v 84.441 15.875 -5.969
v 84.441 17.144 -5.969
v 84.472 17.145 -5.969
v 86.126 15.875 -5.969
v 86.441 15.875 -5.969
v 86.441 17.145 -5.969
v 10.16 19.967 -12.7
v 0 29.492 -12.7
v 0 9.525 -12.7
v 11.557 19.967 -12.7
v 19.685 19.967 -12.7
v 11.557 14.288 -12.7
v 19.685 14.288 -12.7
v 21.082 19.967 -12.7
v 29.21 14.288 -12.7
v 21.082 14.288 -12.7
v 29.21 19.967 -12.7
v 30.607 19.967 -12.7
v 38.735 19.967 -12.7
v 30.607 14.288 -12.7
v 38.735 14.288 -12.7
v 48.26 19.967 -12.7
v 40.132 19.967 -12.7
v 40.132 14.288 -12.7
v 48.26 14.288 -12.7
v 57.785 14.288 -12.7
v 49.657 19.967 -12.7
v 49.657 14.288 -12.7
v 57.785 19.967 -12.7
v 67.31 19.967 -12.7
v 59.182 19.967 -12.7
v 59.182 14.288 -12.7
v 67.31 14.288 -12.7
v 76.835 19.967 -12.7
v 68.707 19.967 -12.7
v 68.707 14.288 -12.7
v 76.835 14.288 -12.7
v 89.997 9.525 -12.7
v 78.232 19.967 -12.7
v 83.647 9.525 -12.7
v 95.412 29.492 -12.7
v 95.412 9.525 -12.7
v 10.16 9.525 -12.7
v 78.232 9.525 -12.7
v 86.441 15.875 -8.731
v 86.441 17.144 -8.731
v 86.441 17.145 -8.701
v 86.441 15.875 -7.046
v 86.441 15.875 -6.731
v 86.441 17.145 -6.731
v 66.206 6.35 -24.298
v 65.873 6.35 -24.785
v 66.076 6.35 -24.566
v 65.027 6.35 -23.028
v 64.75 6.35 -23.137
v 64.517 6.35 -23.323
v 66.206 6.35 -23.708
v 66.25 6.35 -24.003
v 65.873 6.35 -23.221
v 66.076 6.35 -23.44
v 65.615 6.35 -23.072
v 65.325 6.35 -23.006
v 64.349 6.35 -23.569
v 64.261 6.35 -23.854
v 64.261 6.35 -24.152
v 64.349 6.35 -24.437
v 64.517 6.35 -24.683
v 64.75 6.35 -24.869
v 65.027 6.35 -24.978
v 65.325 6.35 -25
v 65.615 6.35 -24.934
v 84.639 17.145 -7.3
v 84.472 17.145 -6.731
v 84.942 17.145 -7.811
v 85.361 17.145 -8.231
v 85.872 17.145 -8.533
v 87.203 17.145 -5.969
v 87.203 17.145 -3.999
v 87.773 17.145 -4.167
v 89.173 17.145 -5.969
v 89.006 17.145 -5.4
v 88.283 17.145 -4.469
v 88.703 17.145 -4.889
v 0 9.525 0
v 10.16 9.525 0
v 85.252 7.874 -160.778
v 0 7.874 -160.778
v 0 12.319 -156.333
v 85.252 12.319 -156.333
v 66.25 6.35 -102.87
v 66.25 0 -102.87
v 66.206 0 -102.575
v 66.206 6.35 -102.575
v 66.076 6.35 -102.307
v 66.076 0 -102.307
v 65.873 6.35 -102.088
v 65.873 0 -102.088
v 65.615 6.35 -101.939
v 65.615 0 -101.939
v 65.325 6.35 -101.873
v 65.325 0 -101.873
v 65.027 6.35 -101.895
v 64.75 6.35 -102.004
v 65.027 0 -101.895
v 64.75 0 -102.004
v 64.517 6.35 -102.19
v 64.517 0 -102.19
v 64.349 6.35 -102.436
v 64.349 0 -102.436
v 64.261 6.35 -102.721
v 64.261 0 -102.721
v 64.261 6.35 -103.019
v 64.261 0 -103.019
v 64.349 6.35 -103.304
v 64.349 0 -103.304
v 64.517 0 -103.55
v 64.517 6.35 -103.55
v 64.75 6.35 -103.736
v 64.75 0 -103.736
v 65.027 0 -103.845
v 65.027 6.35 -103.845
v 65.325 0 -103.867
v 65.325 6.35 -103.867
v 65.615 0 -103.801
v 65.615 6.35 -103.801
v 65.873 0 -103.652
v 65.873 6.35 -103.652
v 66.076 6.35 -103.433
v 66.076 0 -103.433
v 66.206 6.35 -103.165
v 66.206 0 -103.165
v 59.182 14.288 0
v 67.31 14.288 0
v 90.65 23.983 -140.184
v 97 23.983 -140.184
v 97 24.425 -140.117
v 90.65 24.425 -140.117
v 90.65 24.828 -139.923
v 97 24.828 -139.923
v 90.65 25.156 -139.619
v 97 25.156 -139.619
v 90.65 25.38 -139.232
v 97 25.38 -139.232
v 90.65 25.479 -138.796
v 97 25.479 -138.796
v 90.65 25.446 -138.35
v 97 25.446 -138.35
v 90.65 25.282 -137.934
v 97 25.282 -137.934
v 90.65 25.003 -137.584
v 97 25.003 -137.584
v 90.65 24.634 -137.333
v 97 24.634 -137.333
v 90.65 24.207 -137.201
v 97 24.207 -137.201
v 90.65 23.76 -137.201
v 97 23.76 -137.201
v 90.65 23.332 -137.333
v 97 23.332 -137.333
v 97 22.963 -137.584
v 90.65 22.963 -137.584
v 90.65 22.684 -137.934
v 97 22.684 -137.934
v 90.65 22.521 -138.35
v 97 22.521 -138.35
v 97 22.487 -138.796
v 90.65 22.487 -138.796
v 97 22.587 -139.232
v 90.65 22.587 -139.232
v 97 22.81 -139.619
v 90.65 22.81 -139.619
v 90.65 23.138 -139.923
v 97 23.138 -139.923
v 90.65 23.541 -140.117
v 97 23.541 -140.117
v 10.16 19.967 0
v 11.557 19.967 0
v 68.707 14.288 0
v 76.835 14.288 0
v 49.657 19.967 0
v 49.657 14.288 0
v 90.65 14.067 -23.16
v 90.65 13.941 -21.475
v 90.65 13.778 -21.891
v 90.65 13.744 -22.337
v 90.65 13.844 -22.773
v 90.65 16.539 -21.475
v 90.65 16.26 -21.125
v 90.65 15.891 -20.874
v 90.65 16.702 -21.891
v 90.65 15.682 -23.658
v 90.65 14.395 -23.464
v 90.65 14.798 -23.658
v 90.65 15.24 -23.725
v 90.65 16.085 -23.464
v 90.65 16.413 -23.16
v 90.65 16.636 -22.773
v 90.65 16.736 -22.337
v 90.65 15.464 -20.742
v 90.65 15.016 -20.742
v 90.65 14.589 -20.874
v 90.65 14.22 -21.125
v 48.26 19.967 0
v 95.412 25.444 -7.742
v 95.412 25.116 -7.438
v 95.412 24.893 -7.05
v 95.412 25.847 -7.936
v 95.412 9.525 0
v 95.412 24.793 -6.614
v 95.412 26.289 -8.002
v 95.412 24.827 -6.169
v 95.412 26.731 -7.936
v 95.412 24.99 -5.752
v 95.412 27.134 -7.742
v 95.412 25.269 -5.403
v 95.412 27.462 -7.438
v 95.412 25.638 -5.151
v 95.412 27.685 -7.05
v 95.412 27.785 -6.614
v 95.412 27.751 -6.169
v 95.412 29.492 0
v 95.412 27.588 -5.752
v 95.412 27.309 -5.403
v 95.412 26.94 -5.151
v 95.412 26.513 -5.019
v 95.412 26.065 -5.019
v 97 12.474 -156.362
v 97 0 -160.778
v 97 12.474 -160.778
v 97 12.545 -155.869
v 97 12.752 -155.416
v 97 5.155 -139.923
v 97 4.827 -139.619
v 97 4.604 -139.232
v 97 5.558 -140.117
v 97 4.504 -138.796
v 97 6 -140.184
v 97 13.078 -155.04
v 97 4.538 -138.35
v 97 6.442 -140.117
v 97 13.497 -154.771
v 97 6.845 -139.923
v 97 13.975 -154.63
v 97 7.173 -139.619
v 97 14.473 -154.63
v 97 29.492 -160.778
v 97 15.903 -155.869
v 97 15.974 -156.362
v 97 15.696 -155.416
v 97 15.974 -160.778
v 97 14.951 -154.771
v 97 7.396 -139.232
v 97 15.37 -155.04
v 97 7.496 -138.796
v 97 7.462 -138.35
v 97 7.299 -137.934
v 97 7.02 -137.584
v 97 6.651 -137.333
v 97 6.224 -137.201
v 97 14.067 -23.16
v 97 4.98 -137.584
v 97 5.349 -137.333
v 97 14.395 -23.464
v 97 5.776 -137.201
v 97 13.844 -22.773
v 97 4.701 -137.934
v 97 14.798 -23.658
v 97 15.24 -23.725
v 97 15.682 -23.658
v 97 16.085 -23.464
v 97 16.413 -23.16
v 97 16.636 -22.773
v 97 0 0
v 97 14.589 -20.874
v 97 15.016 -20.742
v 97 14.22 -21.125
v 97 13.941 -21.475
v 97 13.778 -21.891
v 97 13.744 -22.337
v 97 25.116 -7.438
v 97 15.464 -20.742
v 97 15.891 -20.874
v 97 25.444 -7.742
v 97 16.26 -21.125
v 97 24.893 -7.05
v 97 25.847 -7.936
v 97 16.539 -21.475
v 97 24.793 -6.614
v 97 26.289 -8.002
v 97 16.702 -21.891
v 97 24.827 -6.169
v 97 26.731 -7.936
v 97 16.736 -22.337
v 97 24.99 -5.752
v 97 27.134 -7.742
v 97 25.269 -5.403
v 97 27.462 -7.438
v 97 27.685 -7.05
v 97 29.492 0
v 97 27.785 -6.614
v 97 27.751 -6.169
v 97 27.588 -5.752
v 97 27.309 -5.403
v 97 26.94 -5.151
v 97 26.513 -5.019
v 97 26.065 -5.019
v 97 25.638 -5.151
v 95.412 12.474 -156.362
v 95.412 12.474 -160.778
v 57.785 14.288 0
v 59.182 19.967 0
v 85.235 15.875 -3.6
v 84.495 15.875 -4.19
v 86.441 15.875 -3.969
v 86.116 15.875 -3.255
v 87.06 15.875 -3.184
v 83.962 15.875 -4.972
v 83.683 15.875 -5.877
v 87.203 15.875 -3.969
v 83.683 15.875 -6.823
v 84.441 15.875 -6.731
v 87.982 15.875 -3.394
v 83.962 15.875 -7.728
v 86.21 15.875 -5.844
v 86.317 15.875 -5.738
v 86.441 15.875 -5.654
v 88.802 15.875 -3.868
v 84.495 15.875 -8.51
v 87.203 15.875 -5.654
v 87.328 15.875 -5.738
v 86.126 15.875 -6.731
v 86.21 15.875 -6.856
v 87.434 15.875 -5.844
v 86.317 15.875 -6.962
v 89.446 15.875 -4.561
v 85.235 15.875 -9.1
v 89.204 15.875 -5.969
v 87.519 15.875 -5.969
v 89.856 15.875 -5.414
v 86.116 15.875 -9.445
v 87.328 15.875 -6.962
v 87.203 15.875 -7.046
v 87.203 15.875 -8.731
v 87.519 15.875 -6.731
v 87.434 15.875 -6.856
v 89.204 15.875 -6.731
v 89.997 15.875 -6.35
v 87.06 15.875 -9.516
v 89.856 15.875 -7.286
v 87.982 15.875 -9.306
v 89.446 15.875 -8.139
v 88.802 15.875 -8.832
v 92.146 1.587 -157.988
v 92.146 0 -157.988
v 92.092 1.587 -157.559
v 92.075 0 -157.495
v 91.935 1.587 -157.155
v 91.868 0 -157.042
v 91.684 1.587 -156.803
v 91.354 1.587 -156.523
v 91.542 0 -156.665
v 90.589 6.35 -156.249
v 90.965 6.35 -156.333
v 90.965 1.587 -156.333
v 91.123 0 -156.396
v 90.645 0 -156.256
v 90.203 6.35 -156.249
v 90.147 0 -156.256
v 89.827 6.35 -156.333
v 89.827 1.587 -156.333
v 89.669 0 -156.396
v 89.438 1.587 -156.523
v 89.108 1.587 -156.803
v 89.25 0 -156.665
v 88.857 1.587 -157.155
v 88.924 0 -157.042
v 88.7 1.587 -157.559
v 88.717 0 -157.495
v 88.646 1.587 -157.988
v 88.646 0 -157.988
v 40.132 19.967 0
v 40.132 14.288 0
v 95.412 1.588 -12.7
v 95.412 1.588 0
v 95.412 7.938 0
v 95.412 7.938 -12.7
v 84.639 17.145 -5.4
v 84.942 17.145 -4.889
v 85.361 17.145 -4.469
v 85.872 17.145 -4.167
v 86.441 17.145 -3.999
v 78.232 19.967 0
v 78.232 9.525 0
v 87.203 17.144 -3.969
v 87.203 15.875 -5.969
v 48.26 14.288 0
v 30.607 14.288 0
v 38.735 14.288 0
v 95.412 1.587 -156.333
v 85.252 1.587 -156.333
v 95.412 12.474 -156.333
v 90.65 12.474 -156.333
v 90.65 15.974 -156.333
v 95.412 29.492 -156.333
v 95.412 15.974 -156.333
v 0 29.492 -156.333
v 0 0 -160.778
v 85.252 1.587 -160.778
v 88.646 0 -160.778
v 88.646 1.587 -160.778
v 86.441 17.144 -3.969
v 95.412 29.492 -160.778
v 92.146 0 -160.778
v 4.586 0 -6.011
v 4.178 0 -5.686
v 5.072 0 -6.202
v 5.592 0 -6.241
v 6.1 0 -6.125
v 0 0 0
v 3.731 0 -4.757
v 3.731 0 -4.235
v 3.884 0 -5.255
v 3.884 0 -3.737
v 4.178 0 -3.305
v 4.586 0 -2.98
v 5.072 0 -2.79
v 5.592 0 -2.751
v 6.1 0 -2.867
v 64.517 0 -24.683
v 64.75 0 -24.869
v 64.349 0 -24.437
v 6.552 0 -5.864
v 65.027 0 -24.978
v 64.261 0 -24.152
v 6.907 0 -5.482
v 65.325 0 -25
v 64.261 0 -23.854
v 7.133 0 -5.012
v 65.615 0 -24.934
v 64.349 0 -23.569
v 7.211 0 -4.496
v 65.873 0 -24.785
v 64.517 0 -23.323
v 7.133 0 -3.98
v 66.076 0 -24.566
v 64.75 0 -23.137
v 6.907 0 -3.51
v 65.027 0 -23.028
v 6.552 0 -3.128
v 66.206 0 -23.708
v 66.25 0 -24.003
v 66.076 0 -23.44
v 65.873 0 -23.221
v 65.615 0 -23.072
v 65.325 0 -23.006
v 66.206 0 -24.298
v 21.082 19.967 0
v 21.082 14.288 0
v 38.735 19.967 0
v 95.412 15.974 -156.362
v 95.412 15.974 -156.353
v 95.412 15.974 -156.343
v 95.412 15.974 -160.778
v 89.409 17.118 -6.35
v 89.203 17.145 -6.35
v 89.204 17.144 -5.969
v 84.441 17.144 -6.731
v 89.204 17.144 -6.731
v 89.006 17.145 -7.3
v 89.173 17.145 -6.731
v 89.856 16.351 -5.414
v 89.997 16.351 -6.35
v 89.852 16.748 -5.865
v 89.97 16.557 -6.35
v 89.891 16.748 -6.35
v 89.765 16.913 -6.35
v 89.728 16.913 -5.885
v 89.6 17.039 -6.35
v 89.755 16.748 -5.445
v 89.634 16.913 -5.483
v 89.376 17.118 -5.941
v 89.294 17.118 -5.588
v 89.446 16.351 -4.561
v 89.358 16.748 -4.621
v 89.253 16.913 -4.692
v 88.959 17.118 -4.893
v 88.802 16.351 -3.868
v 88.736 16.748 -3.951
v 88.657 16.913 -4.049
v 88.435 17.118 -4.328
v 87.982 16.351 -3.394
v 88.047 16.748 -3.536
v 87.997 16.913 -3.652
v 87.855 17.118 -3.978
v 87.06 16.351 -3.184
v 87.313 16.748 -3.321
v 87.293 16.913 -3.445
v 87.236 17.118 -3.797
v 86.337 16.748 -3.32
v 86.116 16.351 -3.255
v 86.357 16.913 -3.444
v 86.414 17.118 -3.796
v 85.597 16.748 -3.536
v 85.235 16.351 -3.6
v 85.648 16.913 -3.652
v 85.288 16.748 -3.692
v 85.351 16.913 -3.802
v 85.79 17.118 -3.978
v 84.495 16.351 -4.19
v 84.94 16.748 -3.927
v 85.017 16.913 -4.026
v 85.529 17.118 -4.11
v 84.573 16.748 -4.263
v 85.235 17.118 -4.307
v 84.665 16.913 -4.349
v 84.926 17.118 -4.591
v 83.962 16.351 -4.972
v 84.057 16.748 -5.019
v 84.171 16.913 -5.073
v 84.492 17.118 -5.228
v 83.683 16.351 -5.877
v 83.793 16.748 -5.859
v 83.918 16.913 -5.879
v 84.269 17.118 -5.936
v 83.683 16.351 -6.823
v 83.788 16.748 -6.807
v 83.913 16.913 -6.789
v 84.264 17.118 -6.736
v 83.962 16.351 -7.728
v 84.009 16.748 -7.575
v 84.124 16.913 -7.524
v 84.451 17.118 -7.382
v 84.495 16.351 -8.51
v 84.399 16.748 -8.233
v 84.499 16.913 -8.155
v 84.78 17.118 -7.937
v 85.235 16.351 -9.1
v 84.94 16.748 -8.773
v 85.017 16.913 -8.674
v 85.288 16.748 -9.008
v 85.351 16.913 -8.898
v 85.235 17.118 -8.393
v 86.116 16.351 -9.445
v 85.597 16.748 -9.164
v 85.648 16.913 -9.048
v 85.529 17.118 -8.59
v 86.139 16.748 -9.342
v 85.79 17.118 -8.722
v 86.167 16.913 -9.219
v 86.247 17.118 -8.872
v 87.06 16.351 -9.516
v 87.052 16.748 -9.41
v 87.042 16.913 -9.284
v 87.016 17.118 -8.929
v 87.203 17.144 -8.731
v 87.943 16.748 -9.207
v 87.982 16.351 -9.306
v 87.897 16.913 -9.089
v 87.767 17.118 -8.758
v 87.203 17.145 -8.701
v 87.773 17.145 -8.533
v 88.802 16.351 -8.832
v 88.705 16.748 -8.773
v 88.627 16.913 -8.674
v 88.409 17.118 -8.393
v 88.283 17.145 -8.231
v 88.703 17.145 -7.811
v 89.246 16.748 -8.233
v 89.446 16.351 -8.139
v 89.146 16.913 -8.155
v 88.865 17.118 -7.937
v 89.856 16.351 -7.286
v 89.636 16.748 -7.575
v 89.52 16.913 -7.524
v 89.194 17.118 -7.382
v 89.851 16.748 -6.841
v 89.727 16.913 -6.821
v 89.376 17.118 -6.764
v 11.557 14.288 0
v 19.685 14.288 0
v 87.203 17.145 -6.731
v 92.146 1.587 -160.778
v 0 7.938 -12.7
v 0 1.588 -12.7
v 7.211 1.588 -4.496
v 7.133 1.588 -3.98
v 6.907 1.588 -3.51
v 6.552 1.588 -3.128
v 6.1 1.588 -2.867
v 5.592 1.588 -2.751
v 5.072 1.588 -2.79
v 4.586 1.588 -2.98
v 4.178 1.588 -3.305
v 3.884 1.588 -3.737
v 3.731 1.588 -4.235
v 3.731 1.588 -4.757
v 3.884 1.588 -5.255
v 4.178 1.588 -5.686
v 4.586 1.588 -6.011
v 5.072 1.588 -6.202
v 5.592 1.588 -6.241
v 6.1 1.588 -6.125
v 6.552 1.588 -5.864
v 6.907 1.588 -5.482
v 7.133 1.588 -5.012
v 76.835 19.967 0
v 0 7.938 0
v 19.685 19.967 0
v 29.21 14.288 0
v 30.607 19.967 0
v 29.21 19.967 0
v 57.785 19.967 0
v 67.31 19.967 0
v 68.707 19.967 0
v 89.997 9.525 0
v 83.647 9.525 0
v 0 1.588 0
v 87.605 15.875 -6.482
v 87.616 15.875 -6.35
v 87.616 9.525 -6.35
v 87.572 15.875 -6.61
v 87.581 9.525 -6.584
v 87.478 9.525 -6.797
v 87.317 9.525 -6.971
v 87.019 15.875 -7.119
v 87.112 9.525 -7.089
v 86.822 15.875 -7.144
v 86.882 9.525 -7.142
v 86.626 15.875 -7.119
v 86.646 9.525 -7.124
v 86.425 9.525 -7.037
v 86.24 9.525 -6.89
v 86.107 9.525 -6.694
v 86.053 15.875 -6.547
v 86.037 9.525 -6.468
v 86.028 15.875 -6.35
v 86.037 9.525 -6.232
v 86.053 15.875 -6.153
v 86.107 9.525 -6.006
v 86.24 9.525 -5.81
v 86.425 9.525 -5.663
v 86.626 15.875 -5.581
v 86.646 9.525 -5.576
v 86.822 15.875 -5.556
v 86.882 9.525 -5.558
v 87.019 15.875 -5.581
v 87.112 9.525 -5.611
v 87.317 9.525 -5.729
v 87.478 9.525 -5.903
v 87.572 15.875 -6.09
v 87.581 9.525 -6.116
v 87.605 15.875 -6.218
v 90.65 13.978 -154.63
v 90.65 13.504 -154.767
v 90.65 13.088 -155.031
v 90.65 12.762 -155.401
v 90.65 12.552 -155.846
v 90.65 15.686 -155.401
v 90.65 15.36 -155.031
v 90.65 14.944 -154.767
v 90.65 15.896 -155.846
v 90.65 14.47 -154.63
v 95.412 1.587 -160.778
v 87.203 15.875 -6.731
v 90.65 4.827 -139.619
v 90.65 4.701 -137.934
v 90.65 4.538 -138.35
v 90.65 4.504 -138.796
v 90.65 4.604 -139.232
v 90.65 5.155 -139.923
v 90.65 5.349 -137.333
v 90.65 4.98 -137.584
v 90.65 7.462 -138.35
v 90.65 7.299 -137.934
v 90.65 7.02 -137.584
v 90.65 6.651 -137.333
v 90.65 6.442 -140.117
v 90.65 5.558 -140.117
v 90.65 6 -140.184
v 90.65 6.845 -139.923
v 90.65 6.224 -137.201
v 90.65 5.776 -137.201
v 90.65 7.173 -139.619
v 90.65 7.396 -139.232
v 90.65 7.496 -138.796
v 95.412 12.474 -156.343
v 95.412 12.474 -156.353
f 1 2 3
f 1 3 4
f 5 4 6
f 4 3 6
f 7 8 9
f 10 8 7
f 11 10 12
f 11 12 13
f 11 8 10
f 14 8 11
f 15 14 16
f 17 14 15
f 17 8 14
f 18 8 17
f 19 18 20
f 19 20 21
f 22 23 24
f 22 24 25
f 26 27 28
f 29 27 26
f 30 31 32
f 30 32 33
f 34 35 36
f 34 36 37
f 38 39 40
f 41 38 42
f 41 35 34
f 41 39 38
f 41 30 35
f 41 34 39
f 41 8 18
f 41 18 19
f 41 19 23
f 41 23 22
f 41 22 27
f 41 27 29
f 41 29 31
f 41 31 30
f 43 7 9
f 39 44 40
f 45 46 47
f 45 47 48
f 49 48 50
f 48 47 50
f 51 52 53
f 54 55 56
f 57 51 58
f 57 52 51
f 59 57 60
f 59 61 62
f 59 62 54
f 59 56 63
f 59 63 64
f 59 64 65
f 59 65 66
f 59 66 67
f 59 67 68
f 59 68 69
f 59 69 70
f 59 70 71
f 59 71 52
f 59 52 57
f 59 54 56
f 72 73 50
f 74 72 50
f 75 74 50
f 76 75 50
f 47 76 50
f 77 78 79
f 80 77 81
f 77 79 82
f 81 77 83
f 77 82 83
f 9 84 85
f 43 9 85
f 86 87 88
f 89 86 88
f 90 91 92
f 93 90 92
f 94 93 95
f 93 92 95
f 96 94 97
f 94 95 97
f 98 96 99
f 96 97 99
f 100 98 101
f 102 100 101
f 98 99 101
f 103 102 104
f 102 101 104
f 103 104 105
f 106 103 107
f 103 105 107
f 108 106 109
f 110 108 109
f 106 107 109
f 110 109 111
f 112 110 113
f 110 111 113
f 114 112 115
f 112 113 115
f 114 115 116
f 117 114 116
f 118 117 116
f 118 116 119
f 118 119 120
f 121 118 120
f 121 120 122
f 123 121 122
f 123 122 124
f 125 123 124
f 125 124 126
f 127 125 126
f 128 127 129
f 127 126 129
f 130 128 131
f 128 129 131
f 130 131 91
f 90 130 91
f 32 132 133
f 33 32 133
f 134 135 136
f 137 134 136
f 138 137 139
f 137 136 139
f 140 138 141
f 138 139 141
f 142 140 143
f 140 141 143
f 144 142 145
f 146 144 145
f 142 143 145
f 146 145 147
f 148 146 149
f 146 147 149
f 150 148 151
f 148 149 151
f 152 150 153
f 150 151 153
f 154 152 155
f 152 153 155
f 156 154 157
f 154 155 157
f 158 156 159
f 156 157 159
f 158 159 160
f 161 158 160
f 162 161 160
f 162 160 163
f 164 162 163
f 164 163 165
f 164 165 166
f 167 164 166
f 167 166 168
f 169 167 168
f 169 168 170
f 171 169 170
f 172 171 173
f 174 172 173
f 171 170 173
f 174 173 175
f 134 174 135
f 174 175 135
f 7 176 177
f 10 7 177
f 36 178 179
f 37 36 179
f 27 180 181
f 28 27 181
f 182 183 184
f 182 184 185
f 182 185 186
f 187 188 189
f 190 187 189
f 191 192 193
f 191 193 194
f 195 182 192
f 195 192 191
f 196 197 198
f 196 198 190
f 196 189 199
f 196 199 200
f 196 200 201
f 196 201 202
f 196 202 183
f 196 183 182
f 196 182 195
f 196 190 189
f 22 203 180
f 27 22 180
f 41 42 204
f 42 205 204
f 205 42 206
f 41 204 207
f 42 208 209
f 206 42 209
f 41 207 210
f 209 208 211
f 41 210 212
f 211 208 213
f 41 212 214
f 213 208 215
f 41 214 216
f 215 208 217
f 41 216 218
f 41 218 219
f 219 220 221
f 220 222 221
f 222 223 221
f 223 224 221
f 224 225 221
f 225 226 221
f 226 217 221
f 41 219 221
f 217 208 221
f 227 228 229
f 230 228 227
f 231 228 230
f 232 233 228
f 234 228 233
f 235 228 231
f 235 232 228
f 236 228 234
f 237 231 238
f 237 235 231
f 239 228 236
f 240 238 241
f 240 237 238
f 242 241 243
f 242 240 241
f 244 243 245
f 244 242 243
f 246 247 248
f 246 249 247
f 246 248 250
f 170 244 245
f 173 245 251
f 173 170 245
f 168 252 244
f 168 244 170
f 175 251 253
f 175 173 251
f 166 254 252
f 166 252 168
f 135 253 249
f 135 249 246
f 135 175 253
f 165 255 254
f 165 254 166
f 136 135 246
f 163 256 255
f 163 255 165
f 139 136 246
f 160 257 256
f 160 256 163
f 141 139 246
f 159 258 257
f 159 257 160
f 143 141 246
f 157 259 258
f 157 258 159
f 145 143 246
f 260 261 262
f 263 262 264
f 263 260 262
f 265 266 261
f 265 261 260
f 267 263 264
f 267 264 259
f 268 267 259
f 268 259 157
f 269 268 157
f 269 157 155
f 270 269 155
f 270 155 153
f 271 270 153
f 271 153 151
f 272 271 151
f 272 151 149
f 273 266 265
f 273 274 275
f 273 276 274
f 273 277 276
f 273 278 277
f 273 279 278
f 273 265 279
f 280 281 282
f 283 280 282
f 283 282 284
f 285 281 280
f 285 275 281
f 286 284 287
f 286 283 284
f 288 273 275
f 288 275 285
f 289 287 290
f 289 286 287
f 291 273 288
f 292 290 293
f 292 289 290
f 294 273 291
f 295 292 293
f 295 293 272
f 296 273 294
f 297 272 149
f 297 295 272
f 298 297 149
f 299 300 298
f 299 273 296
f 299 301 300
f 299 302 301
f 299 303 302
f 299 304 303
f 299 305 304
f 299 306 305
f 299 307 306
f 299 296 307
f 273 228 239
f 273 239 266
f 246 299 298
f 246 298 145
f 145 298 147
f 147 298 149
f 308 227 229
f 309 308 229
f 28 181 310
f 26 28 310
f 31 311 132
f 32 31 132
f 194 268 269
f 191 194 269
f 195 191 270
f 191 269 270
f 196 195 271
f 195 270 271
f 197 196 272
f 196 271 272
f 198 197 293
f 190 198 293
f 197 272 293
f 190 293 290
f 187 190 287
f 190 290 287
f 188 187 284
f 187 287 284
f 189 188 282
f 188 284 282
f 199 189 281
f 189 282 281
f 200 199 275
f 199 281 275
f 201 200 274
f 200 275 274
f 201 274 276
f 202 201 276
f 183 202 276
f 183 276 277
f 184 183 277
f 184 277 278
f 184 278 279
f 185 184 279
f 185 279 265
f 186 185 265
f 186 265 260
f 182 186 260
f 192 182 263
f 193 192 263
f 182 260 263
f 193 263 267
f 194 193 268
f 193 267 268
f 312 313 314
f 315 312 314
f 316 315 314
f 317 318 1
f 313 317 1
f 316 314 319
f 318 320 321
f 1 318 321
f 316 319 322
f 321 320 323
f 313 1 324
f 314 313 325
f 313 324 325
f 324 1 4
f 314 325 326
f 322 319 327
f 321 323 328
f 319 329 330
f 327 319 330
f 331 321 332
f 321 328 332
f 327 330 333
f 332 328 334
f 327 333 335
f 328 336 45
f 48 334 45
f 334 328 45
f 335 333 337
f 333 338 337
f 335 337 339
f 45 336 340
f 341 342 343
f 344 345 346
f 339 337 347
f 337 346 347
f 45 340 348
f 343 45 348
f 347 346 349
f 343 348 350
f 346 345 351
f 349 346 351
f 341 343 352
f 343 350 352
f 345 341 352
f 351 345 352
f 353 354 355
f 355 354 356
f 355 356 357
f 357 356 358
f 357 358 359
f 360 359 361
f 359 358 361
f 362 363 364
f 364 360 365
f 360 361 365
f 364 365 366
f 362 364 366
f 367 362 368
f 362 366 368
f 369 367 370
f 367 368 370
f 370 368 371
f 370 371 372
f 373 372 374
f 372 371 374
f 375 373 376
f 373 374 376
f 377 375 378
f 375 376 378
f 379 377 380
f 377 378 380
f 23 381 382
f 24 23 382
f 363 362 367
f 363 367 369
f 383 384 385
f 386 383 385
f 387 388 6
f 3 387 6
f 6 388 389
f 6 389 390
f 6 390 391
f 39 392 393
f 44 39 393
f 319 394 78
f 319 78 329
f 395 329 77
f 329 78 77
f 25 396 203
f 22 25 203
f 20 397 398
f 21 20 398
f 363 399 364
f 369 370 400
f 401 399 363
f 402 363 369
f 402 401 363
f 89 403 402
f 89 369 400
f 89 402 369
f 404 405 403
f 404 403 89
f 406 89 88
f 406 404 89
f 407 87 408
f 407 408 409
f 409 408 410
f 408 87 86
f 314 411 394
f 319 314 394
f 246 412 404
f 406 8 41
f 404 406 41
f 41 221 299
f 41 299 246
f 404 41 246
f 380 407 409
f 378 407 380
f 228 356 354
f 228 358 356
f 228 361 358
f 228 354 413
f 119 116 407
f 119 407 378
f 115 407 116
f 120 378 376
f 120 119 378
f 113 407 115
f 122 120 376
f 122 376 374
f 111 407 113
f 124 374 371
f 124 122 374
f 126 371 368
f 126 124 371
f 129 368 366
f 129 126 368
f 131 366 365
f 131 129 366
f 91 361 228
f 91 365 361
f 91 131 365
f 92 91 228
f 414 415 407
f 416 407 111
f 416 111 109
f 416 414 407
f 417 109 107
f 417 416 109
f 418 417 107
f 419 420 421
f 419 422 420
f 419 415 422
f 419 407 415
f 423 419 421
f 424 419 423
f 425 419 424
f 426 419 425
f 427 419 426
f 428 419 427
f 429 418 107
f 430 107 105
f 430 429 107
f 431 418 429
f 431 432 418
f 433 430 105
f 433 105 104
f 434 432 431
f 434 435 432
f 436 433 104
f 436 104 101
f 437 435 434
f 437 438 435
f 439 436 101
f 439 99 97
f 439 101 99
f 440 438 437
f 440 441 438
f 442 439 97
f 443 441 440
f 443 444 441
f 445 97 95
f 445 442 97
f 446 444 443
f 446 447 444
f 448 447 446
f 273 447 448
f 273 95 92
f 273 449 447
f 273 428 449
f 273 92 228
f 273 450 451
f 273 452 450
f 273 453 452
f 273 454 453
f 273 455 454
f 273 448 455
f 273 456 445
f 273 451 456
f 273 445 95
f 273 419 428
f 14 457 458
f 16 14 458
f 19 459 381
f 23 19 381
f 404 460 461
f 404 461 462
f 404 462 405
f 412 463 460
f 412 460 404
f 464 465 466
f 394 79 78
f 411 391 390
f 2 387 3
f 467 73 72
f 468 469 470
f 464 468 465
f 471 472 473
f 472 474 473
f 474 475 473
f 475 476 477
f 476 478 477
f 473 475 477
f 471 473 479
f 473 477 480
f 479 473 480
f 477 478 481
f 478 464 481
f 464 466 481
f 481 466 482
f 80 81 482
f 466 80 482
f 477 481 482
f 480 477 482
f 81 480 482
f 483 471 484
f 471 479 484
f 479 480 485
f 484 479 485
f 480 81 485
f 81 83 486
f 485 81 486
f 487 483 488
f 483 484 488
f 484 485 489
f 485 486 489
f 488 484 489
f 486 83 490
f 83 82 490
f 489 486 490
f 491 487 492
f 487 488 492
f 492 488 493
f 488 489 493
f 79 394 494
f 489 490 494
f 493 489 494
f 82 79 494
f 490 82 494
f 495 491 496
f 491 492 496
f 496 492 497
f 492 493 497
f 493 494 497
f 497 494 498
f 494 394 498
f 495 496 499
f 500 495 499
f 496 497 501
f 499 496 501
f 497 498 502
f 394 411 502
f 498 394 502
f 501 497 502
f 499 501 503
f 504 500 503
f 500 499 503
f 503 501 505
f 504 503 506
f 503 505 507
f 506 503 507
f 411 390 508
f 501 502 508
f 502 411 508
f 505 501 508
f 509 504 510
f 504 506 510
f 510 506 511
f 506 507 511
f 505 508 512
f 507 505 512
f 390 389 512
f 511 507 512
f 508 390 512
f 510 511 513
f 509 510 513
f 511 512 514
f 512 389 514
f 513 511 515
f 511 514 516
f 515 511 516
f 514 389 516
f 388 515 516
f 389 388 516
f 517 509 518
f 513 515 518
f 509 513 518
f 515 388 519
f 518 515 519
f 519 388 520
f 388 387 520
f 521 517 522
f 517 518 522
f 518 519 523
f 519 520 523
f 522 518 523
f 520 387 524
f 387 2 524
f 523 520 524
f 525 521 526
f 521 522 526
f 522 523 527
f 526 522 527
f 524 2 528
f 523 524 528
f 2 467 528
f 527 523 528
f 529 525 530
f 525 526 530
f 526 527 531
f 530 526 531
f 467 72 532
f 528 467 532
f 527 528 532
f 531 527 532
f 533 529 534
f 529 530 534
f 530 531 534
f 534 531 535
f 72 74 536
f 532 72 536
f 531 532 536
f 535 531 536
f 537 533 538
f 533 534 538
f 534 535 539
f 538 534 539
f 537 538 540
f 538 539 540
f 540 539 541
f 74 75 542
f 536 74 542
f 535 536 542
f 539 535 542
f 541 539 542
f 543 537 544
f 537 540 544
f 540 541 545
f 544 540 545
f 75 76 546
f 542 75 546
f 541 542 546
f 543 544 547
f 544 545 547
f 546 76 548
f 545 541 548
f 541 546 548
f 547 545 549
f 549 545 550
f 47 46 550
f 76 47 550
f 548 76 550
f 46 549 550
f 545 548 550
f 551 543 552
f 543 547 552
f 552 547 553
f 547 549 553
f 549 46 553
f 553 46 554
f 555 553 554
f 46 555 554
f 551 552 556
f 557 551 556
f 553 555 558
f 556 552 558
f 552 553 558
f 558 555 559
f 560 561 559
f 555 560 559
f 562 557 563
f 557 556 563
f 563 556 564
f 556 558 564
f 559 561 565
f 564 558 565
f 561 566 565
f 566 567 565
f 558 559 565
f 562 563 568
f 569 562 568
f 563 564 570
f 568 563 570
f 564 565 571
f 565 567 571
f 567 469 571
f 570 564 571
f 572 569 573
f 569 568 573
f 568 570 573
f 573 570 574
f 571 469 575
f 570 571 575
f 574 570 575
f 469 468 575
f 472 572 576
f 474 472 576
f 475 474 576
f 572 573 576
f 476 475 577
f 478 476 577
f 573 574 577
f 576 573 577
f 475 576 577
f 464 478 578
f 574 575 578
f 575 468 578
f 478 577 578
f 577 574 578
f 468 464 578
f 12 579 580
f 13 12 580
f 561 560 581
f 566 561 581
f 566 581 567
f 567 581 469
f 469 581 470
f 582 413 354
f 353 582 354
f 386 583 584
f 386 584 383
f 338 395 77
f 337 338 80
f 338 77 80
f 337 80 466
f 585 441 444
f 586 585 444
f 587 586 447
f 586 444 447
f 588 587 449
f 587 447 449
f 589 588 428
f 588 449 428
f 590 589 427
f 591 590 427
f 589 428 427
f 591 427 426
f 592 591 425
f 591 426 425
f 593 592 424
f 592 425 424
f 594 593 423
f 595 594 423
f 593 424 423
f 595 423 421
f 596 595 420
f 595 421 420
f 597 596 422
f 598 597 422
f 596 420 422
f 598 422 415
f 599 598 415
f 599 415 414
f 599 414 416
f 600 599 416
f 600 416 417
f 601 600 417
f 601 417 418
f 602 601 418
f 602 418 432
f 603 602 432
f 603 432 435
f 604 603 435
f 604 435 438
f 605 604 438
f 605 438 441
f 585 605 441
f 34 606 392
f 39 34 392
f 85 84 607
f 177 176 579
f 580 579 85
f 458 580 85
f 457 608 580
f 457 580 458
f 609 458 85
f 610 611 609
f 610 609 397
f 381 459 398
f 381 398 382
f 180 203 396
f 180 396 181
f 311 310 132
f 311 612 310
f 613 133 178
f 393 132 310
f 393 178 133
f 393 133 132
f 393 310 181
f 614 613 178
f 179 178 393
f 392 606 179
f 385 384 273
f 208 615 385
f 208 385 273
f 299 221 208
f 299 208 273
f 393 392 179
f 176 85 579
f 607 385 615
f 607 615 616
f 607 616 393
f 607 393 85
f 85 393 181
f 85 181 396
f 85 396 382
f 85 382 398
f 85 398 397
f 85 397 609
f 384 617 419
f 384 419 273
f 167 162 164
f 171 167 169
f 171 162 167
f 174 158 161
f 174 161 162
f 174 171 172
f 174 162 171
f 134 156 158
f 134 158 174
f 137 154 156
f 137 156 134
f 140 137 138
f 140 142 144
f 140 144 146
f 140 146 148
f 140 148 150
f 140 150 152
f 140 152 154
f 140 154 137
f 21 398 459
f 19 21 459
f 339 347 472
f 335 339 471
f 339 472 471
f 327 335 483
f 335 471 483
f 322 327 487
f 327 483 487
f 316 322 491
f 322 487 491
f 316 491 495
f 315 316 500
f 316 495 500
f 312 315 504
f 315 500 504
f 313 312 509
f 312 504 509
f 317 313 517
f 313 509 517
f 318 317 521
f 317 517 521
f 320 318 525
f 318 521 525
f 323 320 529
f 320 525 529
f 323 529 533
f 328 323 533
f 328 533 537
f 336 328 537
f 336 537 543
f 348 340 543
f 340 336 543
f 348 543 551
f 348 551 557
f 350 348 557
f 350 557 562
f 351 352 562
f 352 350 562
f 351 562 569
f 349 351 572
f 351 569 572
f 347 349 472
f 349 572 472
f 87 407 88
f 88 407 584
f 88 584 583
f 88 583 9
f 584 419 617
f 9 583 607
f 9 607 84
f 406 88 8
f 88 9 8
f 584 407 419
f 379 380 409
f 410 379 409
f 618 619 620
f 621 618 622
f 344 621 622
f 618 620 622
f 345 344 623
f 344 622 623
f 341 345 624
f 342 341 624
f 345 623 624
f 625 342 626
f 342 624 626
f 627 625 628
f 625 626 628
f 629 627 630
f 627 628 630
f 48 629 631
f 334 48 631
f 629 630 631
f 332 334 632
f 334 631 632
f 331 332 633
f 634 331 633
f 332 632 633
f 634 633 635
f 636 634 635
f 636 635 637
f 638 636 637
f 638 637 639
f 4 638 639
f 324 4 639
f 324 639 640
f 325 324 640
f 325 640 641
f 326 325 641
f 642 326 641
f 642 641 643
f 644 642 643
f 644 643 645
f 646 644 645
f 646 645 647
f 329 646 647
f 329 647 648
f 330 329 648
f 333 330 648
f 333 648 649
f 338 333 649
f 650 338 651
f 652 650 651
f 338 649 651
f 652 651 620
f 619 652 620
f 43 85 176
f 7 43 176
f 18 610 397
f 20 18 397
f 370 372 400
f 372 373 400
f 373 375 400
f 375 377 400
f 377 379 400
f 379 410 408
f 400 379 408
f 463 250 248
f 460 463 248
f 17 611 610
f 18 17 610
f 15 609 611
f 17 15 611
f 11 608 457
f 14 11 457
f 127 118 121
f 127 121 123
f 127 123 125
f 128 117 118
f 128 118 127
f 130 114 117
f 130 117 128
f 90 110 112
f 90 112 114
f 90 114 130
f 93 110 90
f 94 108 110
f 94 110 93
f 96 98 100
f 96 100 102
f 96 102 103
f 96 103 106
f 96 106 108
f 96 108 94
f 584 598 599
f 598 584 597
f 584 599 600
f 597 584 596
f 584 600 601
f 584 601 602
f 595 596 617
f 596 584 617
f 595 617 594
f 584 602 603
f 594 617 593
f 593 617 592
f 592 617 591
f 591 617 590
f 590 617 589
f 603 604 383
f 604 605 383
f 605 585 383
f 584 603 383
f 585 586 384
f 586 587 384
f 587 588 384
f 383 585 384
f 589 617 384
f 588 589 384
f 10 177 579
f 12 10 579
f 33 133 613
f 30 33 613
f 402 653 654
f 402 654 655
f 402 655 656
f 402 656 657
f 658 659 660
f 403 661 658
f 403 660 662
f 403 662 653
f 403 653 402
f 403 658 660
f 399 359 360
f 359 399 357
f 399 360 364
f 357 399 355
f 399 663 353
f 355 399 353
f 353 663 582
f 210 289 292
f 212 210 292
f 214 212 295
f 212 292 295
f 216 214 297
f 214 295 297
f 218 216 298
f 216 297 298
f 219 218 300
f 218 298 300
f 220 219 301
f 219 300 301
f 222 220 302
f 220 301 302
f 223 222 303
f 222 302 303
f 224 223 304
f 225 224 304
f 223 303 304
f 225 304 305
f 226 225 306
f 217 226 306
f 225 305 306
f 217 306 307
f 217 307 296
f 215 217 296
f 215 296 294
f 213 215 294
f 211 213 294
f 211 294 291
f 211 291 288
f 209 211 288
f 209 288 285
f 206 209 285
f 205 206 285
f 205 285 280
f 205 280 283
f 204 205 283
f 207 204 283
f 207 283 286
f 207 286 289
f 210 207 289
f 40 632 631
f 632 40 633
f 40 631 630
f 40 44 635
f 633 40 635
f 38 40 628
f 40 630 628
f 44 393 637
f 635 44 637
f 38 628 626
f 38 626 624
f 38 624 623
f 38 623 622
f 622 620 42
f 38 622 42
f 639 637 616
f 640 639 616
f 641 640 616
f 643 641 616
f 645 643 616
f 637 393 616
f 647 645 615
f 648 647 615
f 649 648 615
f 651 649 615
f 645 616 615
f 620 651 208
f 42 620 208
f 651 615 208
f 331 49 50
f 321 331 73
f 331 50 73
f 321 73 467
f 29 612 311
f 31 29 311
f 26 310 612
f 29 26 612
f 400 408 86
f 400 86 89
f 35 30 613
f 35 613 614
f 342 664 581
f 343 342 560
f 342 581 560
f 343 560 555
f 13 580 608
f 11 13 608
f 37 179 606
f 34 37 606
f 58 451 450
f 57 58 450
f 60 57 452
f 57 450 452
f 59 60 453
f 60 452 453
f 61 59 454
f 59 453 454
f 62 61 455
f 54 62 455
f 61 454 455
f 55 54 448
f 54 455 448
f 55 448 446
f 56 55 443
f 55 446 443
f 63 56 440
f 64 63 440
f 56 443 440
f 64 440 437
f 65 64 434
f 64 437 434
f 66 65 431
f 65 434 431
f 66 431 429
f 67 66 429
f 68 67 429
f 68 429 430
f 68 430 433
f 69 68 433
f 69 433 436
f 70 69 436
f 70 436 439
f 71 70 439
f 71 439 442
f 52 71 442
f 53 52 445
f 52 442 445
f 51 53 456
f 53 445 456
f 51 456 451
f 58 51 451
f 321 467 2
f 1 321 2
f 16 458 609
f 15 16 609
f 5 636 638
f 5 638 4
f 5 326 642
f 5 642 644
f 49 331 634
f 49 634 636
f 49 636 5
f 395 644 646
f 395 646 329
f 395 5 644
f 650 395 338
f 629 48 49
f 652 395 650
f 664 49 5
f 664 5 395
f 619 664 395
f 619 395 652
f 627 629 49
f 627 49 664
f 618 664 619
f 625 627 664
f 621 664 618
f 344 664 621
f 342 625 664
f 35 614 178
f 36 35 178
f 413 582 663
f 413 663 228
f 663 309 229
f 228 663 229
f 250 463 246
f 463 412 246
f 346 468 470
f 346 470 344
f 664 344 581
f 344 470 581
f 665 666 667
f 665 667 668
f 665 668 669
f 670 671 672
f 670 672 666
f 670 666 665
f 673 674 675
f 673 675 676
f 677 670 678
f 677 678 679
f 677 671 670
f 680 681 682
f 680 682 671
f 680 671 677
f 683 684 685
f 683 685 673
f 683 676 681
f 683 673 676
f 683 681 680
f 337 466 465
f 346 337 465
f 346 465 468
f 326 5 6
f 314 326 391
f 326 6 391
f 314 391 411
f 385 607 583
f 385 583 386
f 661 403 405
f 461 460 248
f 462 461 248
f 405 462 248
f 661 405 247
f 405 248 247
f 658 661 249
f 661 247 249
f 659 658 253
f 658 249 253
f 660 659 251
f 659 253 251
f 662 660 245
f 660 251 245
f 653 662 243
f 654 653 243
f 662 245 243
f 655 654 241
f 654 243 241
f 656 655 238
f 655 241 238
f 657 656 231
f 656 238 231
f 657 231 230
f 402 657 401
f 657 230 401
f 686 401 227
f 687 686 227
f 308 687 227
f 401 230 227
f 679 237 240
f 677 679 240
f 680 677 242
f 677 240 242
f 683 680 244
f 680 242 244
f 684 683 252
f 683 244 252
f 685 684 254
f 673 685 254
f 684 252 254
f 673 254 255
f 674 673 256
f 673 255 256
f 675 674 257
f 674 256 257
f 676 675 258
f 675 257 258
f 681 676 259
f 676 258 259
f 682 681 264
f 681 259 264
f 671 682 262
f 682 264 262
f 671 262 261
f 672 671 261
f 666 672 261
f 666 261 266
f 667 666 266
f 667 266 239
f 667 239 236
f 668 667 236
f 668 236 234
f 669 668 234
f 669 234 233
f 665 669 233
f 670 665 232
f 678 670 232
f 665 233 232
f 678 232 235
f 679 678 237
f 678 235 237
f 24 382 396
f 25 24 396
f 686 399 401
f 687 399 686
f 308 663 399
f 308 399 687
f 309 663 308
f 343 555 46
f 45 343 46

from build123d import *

# Parameters (mm, degrees)
SKETCH1_W           = 97
SKETCH1_H           = 29.491999944
BOSS_EXTRUDE1_DEPTH = 160.778000008
SKETCH2_W           = 95.4125
SKETCH2_H           = 6.35
CUT_EXTRUDE1_DEPTH  = 12.7
CUT_EXTRUDE2_DEPTH  = 19.967
SKETCH4_R           = 3.175
SKETCH4_R_2         = 0.79375
CUT_EXTRUDE3_DEPTH  = 6.35
FILLET1_R           = 0.79375
CUT_EXTRUDE4_DEPTH  = 1.27
SKETCH6_W           = 10.16
SKETCH6_H           = 27.904499944
CUT_EXTRUDE6_DEPTH  = 4.445
SKETCH7_R           = 1.5
CUT_EXTRUDE7_DEPTH  = 6.35
SKETCH8_R           = 1
SKETCH8_R_2         = 1.75
CUT_EXTRUDE8_DEPTH  = 6.35
CUT_EXTRUDE9_DEPTH  = 95.4125


with BuildPart() as part:
    # Sketch1 → Boss-Extrude1 (new body)
    with BuildSketch(Plane.XY):
        with Locations((48.5, 14.745999972)):
            Rectangle(SKETCH1_W, SKETCH1_H)
    extrude(amount=-BOSS_EXTRUDE1_DEPTH)

    # Sketch2 → Cut-Extrude1 (cut)
    with BuildSketch(Plane.XY):
        Polygon((95.4125, 9.525), (95.4125, 29.491999944), (0, 29.491999944), (0, 9.525), (10.16, 9.525), (10.16, 19.966999944), (11.557, 19.966999944), (11.557, 14.2875), (19.685, 14.2875), (19.685, 19.966999944), (21.082, 19.966999944), (21.082, 14.2875), (29.21, 14.2875), (29.21, 19.966999944), (30.607, 19.966999944), (30.607, 14.2875), (38.735, 14.2875), (38.735, 19.966999944), (40.132, 19.966999944), (40.132, 14.2875), (48.26, 14.2875), (48.26, 19.966999944), (49.657, 19.966999944), (49.657, 14.2875), (57.785, 14.2875), (57.785, 19.966999944), (59.182, 19.966999944), (59.182, 14.2875), (67.31, 14.2875), (67.31, 19.966999944), (68.707, 19.966999944), (68.707, 14.2875), (76.835, 14.2875), (76.835, 19.966999944), (78.232, 19.966999944), (78.232, 9.525), (83.64725, 9.525), (83.64725, 17.145), (89.99725, 17.145), (89.99725, 9.525), align=None)
        with Locations((47.70625, 4.7625)):
            Rectangle(SKETCH2_W, SKETCH2_H)
    extrude(amount=-CUT_EXTRUDE1_DEPTH, mode=Mode.SUBTRACT)

    # Sketch3 → Cut-Extrude2 (cut)
    with BuildSketch(Plane(origin=(0, 29.491999944, 0), x_dir=(1, 0, 0), z_dir=(0, 1, 0))):
        with BuildLine():
            ThreePointArc((89.99725, 6.35), (86.82225, 3.175), (83.64725, 6.35))
            Line((83.64725, 6.35), (83.64725, 0))
            Line((83.64725, 0), (89.99725, 0))
            Line((89.99725, 0), (89.99725, 6.35))
        make_face()
        with BuildLine():
            Line((89.99725, 12.7), (83.64725, 12.7))
            Line((83.64725, 12.7), (83.64725, 6.35))
            ThreePointArc((83.64725, 6.35), (86.82225, 9.525), (89.99725, 6.35))
            Line((89.99725, 6.35), (89.99725, 12.7))
        make_face()
    extrude(amount=-CUT_EXTRUDE2_DEPTH, mode=Mode.SUBTRACT)

    # Sketch4 → Cut-Extrude3 (cut)
    with BuildSketch(Plane(origin=(0, 9.525, 0), x_dir=(1, 0, 0), z_dir=(0, 1, 0))):
        with Locations((86.82225, 6.35)):
            Circle(SKETCH4_R)
        with Locations((86.82225, 6.35)):
            Circle(SKETCH4_R_2, mode=Mode.SUBTRACT)
    extrude(amount=CUT_EXTRUDE3_DEPTH, mode=Mode.SUBTRACT)

    # Fillet1
    fillet1_edges = [part.edges().sort_by_distance(p)[0] for p in [
        (83.64725, 17.145, -6.35),
    ]]
    fillet(fillet1_edges, radius=FILLET1_R)

    # Sketch5 → Cut-Extrude4 (cut)
    with BuildSketch(Plane(origin=(0, 17.145, 0), x_dir=(1, 0, 0), z_dir=(0, 1, 0))):
        Polygon((86.44125, 8.73125), (86.44125, 6.731), (84.441, 6.731), (84.441, 5.969), (86.44125, 5.969), (86.44125, 3.96875), (87.20325, 3.96875), (87.20325, 5.969), (89.2035, 5.969), (89.2035, 6.731), (87.20325, 6.731), (87.20325, 8.73125), align=None)
    extrude(amount=-CUT_EXTRUDE4_DEPTH, mode=Mode.SUBTRACT)

    # Sketch6 → Cut-Extrude6 (cut)
    with BuildSketch(Plane(origin=(0, 0, -160.778000008), x_dir=(-1, 0, 0), z_dir=(0, 0, -1))):
        with Locations((-90.3325, 15.539749972)):
            Rectangle(SKETCH6_W, SKETCH6_H)
    extrude(amount=-CUT_EXTRUDE6_DEPTH, mode=Mode.SUBTRACT)

    # Sketch7 → Cut-Extrude7 (cut)
    with BuildSketch(Plane(origin=(97, 0, 0), x_dir=(0, 0, -1), z_dir=(1, 0, 0))):
        with Locations((6.5024, 26.289)):
            Circle(SKETCH7_R)
        with Locations((22.225, 15.24)):
            Circle(SKETCH7_R)
        with Locations((138.684, 6)):
            Circle(SKETCH7_R)
        with Locations((138.684, 23.9832)):
            Circle(SKETCH7_R)
        with BuildLine():
            Line((160.778000008, 15.974), (156.3624, 15.974))
            ThreePointArc((156.3624, 15.974), (154.6124, 14.224), (156.3624, 12.474))
            Line((156.3624, 12.474), (160.778000008, 12.474))
            Line((160.778000008, 12.474), (160.778000008, 15.974))
        make_face()
    extrude(amount=-CUT_EXTRUDE7_DEPTH, mode=Mode.SUBTRACT)

    # Sketch8 → Cut-Extrude8 (cut)
    with BuildSketch(Plane.XZ):
        with Locations((65.25, -24.003)):
            Circle(SKETCH8_R)
        with Locations((65.25, -102.87)):
            Circle(SKETCH8_R)
        with Locations((5.461, -4.4958)):
            Circle(SKETCH8_R_2)
        with BuildLine():
            Line((92.146, -160.778000008), (92.146, -157.988))
            ThreePointArc((92.146, -157.988), (90.396, -156.238), (88.646, -157.988))
            Line((88.646, -157.988), (88.646, -160.778000008))
            Line((88.646, -160.778000008), (92.146, -160.778000008))
        make_face()
    extrude(amount=-CUT_EXTRUDE8_DEPTH, mode=Mode.SUBTRACT)

    # Sketch9 → Cut-Extrude9 (cut)
    with BuildSketch(Plane.ZY):
        Polygon((-160.778000008, 7.874), (-156.333000008, 12.319), (-156.333000008, 29.491999944), (-160.778000008, 29.491999944), align=None)
    extrude(amount=-CUT_EXTRUDE9_DEPTH, mode=Mode.SUBTRACT)


solid = part.part
